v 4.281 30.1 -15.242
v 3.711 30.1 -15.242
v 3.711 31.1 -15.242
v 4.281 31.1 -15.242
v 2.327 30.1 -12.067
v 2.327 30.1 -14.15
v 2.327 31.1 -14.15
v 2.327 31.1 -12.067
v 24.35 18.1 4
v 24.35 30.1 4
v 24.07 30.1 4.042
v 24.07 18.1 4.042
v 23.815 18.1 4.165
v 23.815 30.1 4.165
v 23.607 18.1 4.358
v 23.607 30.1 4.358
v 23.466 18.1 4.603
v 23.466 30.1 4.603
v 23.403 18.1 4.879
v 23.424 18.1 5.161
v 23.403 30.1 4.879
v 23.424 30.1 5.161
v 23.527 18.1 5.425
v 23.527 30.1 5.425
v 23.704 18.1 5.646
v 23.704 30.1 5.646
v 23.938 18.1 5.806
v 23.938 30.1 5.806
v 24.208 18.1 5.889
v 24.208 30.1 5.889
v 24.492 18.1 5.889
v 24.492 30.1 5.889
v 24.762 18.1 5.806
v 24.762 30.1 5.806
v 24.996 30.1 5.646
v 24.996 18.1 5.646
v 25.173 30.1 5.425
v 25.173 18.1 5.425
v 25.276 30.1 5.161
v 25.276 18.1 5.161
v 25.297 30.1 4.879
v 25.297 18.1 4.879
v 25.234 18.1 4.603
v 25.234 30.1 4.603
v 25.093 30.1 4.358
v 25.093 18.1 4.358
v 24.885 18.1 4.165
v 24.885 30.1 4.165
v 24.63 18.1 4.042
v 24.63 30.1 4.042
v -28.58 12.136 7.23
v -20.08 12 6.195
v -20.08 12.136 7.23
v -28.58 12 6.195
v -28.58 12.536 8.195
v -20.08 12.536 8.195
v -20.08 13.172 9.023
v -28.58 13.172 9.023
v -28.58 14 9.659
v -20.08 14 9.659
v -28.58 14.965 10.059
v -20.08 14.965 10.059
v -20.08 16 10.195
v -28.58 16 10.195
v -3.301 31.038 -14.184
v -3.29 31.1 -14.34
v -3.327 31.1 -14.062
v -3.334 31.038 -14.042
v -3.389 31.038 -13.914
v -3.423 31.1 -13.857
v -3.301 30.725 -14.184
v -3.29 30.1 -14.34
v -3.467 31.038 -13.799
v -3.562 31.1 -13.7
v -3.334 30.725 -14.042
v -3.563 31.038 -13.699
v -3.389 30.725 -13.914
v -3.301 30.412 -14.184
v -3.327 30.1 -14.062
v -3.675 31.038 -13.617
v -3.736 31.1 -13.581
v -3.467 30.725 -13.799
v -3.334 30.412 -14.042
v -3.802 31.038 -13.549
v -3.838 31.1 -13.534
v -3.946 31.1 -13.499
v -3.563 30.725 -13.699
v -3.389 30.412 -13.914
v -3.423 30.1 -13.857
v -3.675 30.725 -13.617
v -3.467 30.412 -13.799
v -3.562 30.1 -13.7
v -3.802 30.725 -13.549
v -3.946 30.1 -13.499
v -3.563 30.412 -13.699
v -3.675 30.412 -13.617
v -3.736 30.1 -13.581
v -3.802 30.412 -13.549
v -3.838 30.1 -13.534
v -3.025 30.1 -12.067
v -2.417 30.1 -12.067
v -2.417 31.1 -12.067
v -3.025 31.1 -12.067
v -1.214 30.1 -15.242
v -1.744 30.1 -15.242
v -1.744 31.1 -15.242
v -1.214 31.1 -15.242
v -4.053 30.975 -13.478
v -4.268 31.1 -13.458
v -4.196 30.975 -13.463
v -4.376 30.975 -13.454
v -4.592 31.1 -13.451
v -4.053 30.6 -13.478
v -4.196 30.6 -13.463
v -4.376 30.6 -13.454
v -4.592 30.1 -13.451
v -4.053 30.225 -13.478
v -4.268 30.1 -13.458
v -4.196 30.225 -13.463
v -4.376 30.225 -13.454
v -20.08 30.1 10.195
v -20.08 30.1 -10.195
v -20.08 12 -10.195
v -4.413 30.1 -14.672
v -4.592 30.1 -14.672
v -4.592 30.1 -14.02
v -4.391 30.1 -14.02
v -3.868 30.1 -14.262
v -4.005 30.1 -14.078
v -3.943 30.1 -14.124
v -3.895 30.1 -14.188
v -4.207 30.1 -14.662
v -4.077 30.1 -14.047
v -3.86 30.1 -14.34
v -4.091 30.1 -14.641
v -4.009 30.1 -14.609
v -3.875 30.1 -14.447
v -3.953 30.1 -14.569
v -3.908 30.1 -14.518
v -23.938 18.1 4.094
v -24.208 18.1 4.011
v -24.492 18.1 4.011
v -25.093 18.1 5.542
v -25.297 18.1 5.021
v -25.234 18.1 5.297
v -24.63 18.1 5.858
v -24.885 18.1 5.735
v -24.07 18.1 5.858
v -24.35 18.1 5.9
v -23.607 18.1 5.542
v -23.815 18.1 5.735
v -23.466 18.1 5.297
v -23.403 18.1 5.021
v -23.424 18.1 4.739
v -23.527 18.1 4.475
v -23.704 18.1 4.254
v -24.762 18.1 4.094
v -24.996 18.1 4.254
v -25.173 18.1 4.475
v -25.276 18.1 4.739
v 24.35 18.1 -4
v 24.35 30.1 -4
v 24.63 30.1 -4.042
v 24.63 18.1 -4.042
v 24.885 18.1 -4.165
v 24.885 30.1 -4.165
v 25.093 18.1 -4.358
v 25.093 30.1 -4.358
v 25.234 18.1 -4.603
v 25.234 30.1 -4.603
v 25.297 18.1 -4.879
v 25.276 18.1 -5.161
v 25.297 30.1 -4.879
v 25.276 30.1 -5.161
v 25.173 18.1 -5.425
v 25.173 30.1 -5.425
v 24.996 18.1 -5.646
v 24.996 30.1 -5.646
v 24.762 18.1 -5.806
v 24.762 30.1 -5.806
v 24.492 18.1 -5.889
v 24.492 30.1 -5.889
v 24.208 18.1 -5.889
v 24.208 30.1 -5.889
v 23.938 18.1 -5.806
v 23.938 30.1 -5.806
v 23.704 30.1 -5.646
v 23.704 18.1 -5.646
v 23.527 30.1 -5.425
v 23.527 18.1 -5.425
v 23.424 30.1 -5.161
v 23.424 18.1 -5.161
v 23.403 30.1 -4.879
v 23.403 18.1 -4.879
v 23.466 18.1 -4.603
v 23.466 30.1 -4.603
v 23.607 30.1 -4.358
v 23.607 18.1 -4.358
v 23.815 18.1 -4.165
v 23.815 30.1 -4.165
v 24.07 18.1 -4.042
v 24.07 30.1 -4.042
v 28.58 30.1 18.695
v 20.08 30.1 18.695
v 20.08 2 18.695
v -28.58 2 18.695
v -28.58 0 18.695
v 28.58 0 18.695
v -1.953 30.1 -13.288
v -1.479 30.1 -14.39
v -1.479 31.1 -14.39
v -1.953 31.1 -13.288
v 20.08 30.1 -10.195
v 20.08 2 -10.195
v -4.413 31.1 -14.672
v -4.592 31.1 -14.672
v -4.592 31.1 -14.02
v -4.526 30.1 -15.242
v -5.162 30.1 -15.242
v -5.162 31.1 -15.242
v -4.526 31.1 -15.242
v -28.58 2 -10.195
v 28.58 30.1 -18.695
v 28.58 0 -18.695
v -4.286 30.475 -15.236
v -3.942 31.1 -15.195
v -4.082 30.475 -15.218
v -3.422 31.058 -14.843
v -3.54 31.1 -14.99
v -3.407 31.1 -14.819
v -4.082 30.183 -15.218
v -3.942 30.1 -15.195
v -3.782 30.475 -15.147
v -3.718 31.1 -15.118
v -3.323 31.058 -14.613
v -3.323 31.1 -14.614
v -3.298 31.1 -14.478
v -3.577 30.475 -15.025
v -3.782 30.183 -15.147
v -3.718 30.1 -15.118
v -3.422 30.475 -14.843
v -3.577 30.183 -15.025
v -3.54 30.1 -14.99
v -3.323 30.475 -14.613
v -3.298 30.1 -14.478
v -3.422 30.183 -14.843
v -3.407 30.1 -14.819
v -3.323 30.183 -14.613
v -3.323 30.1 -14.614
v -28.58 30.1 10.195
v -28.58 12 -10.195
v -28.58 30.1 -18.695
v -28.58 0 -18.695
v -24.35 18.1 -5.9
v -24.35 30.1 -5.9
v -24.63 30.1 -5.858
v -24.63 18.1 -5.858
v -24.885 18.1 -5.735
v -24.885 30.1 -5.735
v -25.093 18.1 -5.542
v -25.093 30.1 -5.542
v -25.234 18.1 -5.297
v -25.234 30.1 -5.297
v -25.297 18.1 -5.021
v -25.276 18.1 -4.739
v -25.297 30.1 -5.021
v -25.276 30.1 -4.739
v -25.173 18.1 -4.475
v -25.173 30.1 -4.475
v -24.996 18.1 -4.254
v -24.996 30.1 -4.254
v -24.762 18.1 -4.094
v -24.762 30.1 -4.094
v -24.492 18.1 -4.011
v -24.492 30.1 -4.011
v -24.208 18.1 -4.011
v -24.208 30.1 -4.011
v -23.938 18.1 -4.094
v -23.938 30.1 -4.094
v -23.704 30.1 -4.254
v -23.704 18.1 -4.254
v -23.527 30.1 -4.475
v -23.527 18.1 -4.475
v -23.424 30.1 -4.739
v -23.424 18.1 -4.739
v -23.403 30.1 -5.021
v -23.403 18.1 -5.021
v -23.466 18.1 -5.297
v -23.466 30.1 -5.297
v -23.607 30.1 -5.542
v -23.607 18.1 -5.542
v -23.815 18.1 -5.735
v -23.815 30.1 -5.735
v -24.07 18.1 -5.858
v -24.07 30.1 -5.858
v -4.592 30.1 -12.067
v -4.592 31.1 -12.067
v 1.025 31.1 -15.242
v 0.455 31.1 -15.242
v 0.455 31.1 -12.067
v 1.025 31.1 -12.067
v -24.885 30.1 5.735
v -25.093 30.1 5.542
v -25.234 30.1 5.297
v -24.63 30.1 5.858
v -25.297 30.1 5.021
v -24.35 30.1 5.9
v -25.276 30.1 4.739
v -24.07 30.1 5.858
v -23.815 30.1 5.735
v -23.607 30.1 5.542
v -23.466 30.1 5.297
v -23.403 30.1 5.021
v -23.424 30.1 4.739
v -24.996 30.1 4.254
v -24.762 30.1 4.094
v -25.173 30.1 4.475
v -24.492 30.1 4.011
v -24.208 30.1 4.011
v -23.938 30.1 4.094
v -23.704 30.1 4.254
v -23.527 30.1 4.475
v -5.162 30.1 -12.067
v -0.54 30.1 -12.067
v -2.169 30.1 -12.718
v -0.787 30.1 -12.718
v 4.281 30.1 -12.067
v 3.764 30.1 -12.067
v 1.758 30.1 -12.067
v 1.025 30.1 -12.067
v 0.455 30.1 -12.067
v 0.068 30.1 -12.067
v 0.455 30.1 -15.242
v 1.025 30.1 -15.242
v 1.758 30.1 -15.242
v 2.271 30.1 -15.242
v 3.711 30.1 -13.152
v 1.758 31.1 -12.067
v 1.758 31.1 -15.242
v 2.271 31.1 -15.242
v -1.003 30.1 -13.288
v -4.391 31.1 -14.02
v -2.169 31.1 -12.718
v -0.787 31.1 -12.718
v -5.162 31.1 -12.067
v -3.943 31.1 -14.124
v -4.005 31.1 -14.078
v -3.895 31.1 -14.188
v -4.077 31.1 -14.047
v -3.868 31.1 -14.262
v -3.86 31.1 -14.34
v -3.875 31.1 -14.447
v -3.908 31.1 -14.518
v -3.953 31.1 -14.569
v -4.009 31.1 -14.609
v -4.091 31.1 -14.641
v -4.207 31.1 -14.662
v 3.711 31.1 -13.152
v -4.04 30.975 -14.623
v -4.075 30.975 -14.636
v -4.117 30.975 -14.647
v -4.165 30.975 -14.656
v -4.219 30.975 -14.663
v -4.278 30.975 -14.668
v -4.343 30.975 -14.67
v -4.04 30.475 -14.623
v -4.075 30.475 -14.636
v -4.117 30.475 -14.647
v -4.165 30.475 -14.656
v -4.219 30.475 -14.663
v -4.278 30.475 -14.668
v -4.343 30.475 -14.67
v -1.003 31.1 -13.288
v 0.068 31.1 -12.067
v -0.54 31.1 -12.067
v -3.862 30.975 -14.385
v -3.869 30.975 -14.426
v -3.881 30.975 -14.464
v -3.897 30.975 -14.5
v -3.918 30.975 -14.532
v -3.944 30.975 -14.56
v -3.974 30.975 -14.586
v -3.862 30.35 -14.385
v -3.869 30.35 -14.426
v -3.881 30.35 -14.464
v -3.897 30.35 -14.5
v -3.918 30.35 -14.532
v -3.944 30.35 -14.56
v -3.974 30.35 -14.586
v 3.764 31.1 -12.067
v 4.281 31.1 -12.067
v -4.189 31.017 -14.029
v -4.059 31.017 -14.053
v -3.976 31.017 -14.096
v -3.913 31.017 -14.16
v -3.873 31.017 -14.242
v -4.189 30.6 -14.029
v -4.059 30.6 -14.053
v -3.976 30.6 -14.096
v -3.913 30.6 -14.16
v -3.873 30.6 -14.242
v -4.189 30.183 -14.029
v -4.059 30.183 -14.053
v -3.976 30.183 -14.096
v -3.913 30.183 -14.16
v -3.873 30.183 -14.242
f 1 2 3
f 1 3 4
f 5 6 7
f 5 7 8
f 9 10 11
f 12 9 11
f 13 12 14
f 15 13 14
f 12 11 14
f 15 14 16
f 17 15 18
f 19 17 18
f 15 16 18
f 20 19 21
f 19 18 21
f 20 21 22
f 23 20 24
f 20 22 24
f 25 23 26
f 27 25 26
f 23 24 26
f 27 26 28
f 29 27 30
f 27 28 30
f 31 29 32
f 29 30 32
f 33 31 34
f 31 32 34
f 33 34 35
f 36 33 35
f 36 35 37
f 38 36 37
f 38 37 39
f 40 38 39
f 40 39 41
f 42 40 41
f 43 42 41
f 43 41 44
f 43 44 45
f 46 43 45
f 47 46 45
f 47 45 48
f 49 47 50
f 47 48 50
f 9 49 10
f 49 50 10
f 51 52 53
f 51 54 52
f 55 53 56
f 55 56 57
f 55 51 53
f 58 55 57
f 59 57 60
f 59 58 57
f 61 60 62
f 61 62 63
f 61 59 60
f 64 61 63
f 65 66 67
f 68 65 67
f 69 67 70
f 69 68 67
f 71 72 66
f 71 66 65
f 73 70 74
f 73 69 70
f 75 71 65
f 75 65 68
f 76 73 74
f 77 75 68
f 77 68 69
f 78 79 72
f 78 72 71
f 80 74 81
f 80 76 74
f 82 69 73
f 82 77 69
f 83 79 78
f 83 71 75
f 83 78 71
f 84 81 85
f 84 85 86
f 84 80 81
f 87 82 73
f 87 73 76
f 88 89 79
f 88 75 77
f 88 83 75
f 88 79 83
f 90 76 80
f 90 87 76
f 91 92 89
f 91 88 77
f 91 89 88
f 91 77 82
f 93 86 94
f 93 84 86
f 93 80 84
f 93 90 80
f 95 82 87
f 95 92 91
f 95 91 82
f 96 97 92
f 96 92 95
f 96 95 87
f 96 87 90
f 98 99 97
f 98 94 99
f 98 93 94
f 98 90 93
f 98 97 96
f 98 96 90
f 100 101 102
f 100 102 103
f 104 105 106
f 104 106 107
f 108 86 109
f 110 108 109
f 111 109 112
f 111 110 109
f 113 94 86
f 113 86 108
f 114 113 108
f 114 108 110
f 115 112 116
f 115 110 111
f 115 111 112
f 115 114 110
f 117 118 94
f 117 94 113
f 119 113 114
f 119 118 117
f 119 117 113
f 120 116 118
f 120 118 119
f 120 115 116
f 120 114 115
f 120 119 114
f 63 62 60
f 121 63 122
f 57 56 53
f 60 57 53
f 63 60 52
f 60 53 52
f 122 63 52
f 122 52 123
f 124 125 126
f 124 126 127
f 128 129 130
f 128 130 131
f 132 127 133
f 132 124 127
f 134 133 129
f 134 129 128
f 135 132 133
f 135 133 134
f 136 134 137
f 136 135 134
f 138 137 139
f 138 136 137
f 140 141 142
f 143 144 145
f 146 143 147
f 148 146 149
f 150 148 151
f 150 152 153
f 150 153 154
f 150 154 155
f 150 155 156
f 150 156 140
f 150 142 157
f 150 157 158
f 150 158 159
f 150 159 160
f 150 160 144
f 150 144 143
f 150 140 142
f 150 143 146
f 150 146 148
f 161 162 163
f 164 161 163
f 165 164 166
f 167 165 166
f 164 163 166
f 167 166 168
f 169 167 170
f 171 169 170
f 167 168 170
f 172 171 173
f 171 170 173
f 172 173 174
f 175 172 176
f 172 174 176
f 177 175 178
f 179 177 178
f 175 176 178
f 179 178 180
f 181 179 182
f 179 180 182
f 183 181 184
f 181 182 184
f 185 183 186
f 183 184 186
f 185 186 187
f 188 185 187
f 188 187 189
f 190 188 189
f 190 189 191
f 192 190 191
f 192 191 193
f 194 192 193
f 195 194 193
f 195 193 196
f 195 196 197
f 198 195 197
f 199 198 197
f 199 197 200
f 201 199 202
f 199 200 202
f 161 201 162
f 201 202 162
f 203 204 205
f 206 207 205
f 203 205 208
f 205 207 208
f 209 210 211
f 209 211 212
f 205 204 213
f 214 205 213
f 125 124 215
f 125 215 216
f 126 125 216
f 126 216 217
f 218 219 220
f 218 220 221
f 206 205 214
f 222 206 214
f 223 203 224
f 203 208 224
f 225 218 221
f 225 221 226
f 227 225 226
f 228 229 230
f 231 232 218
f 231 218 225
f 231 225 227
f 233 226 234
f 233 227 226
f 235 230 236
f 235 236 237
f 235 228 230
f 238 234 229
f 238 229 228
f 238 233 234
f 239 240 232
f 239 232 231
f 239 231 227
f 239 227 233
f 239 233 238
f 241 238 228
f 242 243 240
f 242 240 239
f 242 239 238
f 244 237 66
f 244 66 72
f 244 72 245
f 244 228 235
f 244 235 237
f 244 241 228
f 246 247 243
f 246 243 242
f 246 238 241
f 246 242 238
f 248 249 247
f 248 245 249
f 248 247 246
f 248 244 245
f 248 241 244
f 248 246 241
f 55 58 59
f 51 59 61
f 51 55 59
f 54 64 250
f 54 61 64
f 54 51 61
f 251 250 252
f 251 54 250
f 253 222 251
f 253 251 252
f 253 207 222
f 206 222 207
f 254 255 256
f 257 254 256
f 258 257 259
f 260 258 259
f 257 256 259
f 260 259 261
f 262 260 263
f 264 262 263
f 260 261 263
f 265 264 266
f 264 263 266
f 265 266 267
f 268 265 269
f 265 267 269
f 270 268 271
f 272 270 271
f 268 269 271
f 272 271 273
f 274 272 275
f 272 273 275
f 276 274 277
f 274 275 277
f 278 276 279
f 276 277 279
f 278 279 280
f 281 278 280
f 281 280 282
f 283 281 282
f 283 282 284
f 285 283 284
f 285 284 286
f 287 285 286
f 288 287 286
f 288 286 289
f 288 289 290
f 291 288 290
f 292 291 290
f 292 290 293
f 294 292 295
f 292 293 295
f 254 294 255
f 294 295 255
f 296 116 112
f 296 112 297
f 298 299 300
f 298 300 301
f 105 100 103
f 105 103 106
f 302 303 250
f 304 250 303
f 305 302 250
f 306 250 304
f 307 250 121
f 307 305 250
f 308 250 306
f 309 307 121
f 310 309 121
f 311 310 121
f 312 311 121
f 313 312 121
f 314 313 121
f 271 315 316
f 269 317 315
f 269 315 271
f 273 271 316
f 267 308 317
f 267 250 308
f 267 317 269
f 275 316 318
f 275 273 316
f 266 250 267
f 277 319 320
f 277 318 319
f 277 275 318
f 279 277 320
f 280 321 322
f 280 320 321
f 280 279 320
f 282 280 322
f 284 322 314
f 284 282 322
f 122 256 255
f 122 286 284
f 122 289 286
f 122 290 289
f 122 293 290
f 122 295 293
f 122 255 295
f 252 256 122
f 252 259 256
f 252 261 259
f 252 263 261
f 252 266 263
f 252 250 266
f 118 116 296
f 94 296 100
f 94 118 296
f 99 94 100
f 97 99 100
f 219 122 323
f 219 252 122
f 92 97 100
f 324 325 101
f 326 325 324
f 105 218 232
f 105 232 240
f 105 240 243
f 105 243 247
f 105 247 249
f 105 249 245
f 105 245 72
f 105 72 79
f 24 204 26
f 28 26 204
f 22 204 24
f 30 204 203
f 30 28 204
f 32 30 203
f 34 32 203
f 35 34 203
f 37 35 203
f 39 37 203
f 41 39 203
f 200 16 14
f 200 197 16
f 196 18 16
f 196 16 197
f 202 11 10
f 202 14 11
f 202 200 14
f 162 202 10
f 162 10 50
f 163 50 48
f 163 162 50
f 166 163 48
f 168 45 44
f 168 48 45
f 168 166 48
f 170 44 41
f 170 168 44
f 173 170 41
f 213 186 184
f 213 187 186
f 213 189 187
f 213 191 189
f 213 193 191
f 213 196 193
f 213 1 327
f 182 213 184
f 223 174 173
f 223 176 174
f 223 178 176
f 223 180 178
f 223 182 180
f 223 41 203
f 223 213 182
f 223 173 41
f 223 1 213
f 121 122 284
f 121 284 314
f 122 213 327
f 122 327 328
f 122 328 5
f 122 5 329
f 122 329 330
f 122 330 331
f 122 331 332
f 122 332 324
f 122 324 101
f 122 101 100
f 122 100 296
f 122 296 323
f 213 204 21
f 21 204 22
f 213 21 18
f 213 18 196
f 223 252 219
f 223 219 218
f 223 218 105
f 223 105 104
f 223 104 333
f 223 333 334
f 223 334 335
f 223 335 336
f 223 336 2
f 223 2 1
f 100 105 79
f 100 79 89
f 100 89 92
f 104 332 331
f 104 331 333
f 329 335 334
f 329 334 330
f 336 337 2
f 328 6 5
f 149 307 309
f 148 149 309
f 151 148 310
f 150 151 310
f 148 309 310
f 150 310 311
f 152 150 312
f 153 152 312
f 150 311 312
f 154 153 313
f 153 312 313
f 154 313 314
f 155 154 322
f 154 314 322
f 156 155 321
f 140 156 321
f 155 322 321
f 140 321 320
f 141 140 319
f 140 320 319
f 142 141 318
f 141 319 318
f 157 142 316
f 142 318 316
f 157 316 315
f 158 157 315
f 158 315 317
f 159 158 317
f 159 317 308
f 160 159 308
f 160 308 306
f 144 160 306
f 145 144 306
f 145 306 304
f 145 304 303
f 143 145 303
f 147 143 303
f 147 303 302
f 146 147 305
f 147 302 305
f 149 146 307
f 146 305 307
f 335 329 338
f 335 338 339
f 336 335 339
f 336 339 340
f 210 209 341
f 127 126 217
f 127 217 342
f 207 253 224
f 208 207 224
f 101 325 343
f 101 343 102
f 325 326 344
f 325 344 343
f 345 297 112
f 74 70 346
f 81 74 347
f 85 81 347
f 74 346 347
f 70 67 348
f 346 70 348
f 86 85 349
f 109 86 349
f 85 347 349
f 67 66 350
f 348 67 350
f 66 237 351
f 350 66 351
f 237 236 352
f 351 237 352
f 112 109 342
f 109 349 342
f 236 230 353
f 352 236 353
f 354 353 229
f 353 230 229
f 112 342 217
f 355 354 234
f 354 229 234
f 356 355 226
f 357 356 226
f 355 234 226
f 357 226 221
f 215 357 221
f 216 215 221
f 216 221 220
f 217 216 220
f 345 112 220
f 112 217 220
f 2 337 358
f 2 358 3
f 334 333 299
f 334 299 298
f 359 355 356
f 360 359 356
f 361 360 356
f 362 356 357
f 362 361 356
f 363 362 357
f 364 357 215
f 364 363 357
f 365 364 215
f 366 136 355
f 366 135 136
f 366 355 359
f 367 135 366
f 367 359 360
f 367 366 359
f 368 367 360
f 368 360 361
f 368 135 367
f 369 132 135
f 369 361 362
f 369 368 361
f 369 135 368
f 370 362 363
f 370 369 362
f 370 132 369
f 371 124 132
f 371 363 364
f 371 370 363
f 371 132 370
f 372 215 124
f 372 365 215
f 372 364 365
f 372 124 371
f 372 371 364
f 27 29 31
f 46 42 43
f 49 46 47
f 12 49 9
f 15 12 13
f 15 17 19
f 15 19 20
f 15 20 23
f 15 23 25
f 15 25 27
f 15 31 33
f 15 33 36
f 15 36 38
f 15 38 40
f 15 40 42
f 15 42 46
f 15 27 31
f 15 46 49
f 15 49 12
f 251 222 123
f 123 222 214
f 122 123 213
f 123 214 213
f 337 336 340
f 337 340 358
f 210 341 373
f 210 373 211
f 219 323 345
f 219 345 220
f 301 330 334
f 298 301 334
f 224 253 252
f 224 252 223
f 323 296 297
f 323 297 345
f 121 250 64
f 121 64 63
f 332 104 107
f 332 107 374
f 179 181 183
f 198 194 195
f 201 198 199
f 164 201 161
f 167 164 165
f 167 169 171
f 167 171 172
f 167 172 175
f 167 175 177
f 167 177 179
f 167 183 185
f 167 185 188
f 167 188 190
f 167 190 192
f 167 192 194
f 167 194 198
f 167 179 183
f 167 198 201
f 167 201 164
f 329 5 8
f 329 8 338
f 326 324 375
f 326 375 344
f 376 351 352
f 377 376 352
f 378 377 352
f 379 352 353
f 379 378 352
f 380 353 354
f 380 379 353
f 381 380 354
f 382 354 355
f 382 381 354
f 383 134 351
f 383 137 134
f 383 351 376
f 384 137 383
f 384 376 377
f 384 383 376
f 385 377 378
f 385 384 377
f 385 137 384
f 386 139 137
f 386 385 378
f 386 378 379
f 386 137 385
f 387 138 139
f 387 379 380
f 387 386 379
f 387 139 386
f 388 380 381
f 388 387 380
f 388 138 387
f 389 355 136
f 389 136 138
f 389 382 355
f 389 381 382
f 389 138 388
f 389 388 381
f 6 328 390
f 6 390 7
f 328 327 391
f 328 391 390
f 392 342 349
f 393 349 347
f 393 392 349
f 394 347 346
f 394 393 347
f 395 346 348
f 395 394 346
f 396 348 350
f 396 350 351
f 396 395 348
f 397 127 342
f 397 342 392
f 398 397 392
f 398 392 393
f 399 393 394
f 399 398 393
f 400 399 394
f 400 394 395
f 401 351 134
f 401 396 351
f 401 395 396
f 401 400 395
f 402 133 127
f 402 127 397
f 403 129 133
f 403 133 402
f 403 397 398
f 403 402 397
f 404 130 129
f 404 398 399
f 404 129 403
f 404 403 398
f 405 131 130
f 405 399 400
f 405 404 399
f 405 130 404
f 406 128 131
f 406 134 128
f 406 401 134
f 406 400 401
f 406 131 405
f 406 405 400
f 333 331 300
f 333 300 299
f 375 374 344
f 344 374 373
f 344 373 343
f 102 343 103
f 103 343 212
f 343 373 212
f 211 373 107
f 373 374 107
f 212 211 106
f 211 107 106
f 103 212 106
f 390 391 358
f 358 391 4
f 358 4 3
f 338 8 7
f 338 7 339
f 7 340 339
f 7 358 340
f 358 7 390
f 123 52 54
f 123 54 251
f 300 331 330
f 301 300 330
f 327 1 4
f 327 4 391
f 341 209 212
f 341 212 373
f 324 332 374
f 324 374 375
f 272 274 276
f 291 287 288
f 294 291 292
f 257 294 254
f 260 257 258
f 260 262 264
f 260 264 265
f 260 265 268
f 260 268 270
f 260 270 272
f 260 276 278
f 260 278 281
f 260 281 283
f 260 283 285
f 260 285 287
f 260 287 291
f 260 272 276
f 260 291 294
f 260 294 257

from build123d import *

# Parameters (mm, degrees)
SKETCH1_W           = 57.16
SKETCH1_H           = 37.39
SKETCH1_W_2         = 40.16
SKETCH1_H_2         = 20.39
BOSS_EXTRUDE1_DEPTH = 2
SKETCH2_W           = 57.16
SKETCH2_H           = 37.39
SKETCH2_W_2         = 40.16
SKETCH2_H_2         = 20.39
BOSS_EXTRUDE2_DEPTH = 28.1
SKETCH3_W           = 48.66
SKETCH3_H           = 8.5
CUT_EXTRUDE1_DEPTH  = 28.1
CUT_EXTRUDE2_REACH  = 62.194
SKETCH5_W           = 20.39
SKETCH5_H           = 10
FILLET1_R           = 4
SKETCH6_R           = 0.95
CUT_EXTRUDE3_DEPTH  = 12
SKETCH7_W           = 0.569871794
SKETCH7_H           = 3.175
BOSS_EXTRUDE3_DEPTH = 1


with BuildPart() as part:
    # Sketch1 → Boss-Extrude1 (new body)
    # profile 1 of 2: a face of its own
    with BuildSketch(Plane(origin=(0, 0, 0), x_dir=(1, 0, 0), z_dir=(0, 1, 0))):
        Rectangle(SKETCH1_W, SKETCH1_H)
        Rectangle(SKETCH1_W_2, SKETCH1_H_2, mode=Mode.SUBTRACT)
    # profile 2 of 2: a face of its own
    with BuildSketch(Plane(origin=(0, 0, 0), x_dir=(1, 0, 0), z_dir=(0, 1, 0))):
        Rectangle(SKETCH1_W_2, SKETCH1_H_2)
    extrude(amount=BOSS_EXTRUDE1_DEPTH)

    # Sketch2 → Boss-Extrude2 (add)
    with BuildSketch(Plane(origin=(0, 2, 0), x_dir=(1, 0, 0), z_dir=(0, 1, 0))):
        Rectangle(SKETCH2_W, SKETCH2_H)
        Rectangle(SKETCH2_W_2, SKETCH2_H_2, mode=Mode.SUBTRACT)
    extrude(amount=BOSS_EXTRUDE2_DEPTH)

    # Sketch3 → Cut-Extrude1 (cut)
    with BuildSketch(Plane(origin=(0, 30.1, 0), x_dir=(1, 0, 0), z_dir=(0, 1, 0))):
        with Locations((-4.25, -14.445)):
            Rectangle(SKETCH3_W, SKETCH3_H)
    extrude(amount=-CUT_EXTRUDE1_DEPTH, mode=Mode.SUBTRACT)

    # Sketch5 → Cut-Extrude2 (cut, up to next)
    with BuildSketch(Plane(origin=(-20.08, 0, 0), x_dir=(0, 0, -1), z_dir=(1, 0, 0)), mode=Mode.PRIVATE) as cut_extrude2_sk1:
        with Locations((0, 7)):
            Rectangle(SKETCH5_W, SKETCH5_H)
    cut_extrude2_tool1 = extrude(cut_extrude2_sk1.sketch, amount=-CUT_EXTRUDE2_REACH, mode=Mode.PRIVATE) & part.part
    add(cut_extrude2_tool1.solids().sort_by_distance((-20.08, 7, 0))[0], mode=Mode.SUBTRACT)

    # Fillet1
    fillet1_edges = [part.edges().sort_by_distance(p)[0] for p in [
        (-24.33, 12, 10.195),
    ]]
    fillet(fillet1_edges, radius=FILLET1_R)

    # Sketch6 → Cut-Extrude3 (cut)
    with BuildSketch(Plane(origin=(0, 30.1, 0), x_dir=(1, 0, 0), z_dir=(0, 1, 0))):
        with Locations(Location((-24.35, -4.95, 0), (0, 0, 270))):
            Circle(SKETCH6_R)
        with Locations(Location((-24.35, 4.95, 0), (0, 0, 90))):
            Circle(SKETCH6_R)
        with Locations(Location((24.35, 4.95, 0), (0, 0, 270))):
            Circle(SKETCH6_R)
        with Locations(Location((24.35, -4.95, 0), (0, 0, 90))):
            Circle(SKETCH6_R)
    extrude(amount=-CUT_EXTRUDE3_DEPTH, mode=Mode.SUBTRACT)

    # Sketch7 → Boss-Extrude3 (add)
    # profile 1 of 4: a face of its own
    with BuildSketch(Plane(origin=(0, 30.1, 0), x_dir=(1, 0, 0), z_dir=(0, 1, 0))):
        with BuildLine():
            Line((-5.16235185, 15.241554144), (-4.526334221, 15.241554144))
            add(Edge.make_bspline(
                [(-4.526334221, 15.241554144), (-4.484777655, 15.241368128), (-4.404606327, 15.241009264), (-4.288992676, 15.236657561), (-4.182333422, 15.228859045), (-4.08465307, 15.219221313), (-3.995991784, 15.205709587), (-3.916238533, 15.190219451), (-3.845376767, 15.171347958), (-3.782607413, 15.148947756), (-3.726273946, 15.122538794), (-3.672964317, 15.094411364), (-3.623883329, 15.060842269), (-3.576553717, 15.025449442), (-3.533681396, 14.984851821), (-3.492591735, 14.941751237), (-3.455024992, 14.894438355), (-3.420807097, 14.843485885), (-3.389766194, 14.789835212), (-3.362646785, 14.733390423), (-3.340649039, 14.6740622), (-3.322195665, 14.612234331), (-3.307373735, 14.547909509), (-3.297507787, 14.48069213), (-3.290806339, 14.411051534), (-3.290215029, 14.363654099), (-3.289915952, 14.339681147)],
                knots=[0, 0, 0, 0, 1.698747864, 3.27724071, 4.728299578, 6.070144658, 7.288476769, 8.393259625, 9.389771311, 10.283485332, 11.113357557, 11.931608583, 12.74405601, 13.541433047, 14.344816069, 15.154114104, 15.974336324, 16.810834471, 17.661136416, 18.50621059, 19.367396281, 20.244825668, 21.142564693, 22.063065223, 23.020325768, 24, 24, 24, 24], degree=3))
            add(Edge.make_bspline(
                [(-3.289915952, 14.339681147), (-3.290348678, 14.313160441), (-3.291199038, 14.261043994), (-3.299535306, 14.184647677), (-3.313776285, 14.111810705), (-3.332388499, 14.041918832), (-3.358341909, 13.976121933), (-3.38799246, 13.912850075), (-3.424472043, 13.853877205), (-3.466155799, 13.798465646), (-3.511679216, 13.746164873), (-3.562123017, 13.698484974), (-3.616525724, 13.655100917), (-3.674572416, 13.615558031), (-3.73648102, 13.579936086), (-3.802206865, 13.547901518), (-3.872198765, 13.520478893), (-3.920939018, 13.506137082), (-3.945650127, 13.498865843)],
                knots=[0, 0, 0, 0, 1.102006807, 2.165578795, 3.188629044, 4.184801286, 5.166646146, 6.124351954, 7.085497154, 8.042432466, 9.003981491, 9.963833307, 10.922997304, 11.89326795, 12.880200226, 13.889073926, 14.929769137, 16, 16, 16, 16], degree=3))
            add(Edge.make_bspline(
                [(-3.945650127, 13.498865843), (-3.961926284, 13.494816308), (-3.997185683, 13.486043713), (-4.055530303, 13.477137327), (-4.122766351, 13.468948452), (-4.199111247, 13.461911106), (-4.284609004, 13.45712735), (-4.379176838, 13.45339145), (-4.482857606, 13.450675064), (-4.554953112, 13.450578675), (-4.592480055, 13.450528503)],
                knots=[0, 0, 0, 0, 0.618981996, 1.340914327, 2.176866532, 3.120127938, 4.170906482, 5.338178032, 6.614476169, 8, 8, 8, 8], degree=3))
            Line((-4.592480055, 13.450528503), (-4.592480055, 12.066554144))
            Line((-4.592480055, 12.066554144), (-5.16235185, 12.066554144))
            Line((-5.16235185, 12.066554144), (-5.16235185, 15.241554144))
        make_face()
        with BuildLine():
            Line((-4.592480055, 14.020400298), (-4.390862467, 14.020400298))
            add(Edge.make_bspline(
                [(-4.390862467, 14.020400298), (-4.354174963, 14.020632925), (-4.286669412, 14.021060962), (-4.194480668, 14.027250635), (-4.12039602, 14.036703515), (-4.061867772, 14.050261131), (-4.015654177, 14.070836608), (-3.975797844, 14.094638561), (-3.94161205, 14.124735477), (-3.912012184, 14.159126353), (-3.888347983, 14.198643193), (-3.871938093, 14.242642543), (-3.86127855, 14.290199928), (-3.860294043, 14.323296721), (-3.859787747, 14.340317165)],
                knots=[0, 0, 0, 0, 1.8619151, 3.425951444, 4.686033666, 5.651700536, 6.461346321, 7.243864085, 7.999046032, 8.762387399, 9.539336099, 10.322741239, 11.137448474, 12, 12, 12, 12], degree=3))
            add(Edge.make_bspline(
                [(-3.859787747, 14.340317165), (-3.860288835, 14.355187705), (-3.861261065, 14.384040128), (-3.868403335, 14.425681332), (-3.879786058, 14.464499524), (-3.896279186, 14.5000893), (-3.917600896, 14.532390187), (-3.943596375, 14.56138946), (-3.973932049, 14.587708164), (-3.997352964, 14.601639056), (-4.00925189, 14.608716604)],
                knots=[0, 0, 0, 0, 1.102301479, 2.1387299, 3.123554645, 4.094223062, 5.036071848, 5.982632524, 6.975082478, 8, 8, 8, 8], degree=3))
            add(Edge.make_bspline(
                [(-4.00925189, 14.608716604), (-4.019330967, 14.613813882), (-4.040670438, 14.624605865), (-4.077013627, 14.637152333), (-4.118953111, 14.647736662), (-4.166772031, 14.656521552), (-4.220279622, 14.66333954), (-4.279466337, 14.668553594), (-4.344419277, 14.670650369), (-4.38959016, 14.671328868), (-4.413123084, 14.671682349)],
                knots=[0, 0, 0, 0, 0.656809284, 1.390599849, 2.23162475, 3.173112763, 4.218524733, 5.370385145, 6.63003504, 8, 8, 8, 8], degree=3))
            Line((-4.413123084, 14.671682349), (-4.592480055, 14.671682349))
            Line((-4.592480055, 14.671682349), (-4.592480055, 14.020400298))
        make_face(mode=Mode.SUBTRACT)
    # profile 2 of 4: a face of its own
    with BuildSketch(Plane(origin=(0, 30.1, 0), x_dir=(1, 0, 0), z_dir=(0, 1, 0))):
        Polygon((-1.743757098, 15.241554144), (-1.213954414, 15.241554144), (0.068257125, 12.066554144), (-0.540411746, 12.066554144), (-0.787186585, 12.717836195), (-2.169252891, 12.717836195), (-2.416663749, 12.066554144), (-3.025332619, 12.066554144), align=None)
        Polygon((-1.478537747, 14.38992654), (-1.953006898, 13.28770799), (-1.003432579, 13.28770799), align=None, mode=Mode.SUBTRACT)
    # profile 3 of 4: a face of its own
    with BuildSketch(Plane(origin=(0, 30.1, 0), x_dir=(1, 0, 0), z_dir=(0, 1, 0))):
        with Locations((0.73989174, 13.654054144)):
            Rectangle(SKETCH7_W, SKETCH7_H)
    # profile 4 of 4: a face of its own
    with BuildSketch(Plane(origin=(0, 30.1, 0), x_dir=(1, 0, 0), z_dir=(0, 1, 0))):
        Polygon((1.757519945, 15.241554144), (2.270786171, 15.241554144), (3.711366099, 13.152236235), (3.711366099, 15.241554144), (4.281237894, 15.241554144), (4.281237894, 12.066554144), (3.764155562, 12.066554144), (2.32739174, 14.149511876), (2.32739174, 12.066554144), (1.757519945, 12.066554144), align=None)
    extrude(amount=BOSS_EXTRUDE3_DEPTH)


solid = part.part
